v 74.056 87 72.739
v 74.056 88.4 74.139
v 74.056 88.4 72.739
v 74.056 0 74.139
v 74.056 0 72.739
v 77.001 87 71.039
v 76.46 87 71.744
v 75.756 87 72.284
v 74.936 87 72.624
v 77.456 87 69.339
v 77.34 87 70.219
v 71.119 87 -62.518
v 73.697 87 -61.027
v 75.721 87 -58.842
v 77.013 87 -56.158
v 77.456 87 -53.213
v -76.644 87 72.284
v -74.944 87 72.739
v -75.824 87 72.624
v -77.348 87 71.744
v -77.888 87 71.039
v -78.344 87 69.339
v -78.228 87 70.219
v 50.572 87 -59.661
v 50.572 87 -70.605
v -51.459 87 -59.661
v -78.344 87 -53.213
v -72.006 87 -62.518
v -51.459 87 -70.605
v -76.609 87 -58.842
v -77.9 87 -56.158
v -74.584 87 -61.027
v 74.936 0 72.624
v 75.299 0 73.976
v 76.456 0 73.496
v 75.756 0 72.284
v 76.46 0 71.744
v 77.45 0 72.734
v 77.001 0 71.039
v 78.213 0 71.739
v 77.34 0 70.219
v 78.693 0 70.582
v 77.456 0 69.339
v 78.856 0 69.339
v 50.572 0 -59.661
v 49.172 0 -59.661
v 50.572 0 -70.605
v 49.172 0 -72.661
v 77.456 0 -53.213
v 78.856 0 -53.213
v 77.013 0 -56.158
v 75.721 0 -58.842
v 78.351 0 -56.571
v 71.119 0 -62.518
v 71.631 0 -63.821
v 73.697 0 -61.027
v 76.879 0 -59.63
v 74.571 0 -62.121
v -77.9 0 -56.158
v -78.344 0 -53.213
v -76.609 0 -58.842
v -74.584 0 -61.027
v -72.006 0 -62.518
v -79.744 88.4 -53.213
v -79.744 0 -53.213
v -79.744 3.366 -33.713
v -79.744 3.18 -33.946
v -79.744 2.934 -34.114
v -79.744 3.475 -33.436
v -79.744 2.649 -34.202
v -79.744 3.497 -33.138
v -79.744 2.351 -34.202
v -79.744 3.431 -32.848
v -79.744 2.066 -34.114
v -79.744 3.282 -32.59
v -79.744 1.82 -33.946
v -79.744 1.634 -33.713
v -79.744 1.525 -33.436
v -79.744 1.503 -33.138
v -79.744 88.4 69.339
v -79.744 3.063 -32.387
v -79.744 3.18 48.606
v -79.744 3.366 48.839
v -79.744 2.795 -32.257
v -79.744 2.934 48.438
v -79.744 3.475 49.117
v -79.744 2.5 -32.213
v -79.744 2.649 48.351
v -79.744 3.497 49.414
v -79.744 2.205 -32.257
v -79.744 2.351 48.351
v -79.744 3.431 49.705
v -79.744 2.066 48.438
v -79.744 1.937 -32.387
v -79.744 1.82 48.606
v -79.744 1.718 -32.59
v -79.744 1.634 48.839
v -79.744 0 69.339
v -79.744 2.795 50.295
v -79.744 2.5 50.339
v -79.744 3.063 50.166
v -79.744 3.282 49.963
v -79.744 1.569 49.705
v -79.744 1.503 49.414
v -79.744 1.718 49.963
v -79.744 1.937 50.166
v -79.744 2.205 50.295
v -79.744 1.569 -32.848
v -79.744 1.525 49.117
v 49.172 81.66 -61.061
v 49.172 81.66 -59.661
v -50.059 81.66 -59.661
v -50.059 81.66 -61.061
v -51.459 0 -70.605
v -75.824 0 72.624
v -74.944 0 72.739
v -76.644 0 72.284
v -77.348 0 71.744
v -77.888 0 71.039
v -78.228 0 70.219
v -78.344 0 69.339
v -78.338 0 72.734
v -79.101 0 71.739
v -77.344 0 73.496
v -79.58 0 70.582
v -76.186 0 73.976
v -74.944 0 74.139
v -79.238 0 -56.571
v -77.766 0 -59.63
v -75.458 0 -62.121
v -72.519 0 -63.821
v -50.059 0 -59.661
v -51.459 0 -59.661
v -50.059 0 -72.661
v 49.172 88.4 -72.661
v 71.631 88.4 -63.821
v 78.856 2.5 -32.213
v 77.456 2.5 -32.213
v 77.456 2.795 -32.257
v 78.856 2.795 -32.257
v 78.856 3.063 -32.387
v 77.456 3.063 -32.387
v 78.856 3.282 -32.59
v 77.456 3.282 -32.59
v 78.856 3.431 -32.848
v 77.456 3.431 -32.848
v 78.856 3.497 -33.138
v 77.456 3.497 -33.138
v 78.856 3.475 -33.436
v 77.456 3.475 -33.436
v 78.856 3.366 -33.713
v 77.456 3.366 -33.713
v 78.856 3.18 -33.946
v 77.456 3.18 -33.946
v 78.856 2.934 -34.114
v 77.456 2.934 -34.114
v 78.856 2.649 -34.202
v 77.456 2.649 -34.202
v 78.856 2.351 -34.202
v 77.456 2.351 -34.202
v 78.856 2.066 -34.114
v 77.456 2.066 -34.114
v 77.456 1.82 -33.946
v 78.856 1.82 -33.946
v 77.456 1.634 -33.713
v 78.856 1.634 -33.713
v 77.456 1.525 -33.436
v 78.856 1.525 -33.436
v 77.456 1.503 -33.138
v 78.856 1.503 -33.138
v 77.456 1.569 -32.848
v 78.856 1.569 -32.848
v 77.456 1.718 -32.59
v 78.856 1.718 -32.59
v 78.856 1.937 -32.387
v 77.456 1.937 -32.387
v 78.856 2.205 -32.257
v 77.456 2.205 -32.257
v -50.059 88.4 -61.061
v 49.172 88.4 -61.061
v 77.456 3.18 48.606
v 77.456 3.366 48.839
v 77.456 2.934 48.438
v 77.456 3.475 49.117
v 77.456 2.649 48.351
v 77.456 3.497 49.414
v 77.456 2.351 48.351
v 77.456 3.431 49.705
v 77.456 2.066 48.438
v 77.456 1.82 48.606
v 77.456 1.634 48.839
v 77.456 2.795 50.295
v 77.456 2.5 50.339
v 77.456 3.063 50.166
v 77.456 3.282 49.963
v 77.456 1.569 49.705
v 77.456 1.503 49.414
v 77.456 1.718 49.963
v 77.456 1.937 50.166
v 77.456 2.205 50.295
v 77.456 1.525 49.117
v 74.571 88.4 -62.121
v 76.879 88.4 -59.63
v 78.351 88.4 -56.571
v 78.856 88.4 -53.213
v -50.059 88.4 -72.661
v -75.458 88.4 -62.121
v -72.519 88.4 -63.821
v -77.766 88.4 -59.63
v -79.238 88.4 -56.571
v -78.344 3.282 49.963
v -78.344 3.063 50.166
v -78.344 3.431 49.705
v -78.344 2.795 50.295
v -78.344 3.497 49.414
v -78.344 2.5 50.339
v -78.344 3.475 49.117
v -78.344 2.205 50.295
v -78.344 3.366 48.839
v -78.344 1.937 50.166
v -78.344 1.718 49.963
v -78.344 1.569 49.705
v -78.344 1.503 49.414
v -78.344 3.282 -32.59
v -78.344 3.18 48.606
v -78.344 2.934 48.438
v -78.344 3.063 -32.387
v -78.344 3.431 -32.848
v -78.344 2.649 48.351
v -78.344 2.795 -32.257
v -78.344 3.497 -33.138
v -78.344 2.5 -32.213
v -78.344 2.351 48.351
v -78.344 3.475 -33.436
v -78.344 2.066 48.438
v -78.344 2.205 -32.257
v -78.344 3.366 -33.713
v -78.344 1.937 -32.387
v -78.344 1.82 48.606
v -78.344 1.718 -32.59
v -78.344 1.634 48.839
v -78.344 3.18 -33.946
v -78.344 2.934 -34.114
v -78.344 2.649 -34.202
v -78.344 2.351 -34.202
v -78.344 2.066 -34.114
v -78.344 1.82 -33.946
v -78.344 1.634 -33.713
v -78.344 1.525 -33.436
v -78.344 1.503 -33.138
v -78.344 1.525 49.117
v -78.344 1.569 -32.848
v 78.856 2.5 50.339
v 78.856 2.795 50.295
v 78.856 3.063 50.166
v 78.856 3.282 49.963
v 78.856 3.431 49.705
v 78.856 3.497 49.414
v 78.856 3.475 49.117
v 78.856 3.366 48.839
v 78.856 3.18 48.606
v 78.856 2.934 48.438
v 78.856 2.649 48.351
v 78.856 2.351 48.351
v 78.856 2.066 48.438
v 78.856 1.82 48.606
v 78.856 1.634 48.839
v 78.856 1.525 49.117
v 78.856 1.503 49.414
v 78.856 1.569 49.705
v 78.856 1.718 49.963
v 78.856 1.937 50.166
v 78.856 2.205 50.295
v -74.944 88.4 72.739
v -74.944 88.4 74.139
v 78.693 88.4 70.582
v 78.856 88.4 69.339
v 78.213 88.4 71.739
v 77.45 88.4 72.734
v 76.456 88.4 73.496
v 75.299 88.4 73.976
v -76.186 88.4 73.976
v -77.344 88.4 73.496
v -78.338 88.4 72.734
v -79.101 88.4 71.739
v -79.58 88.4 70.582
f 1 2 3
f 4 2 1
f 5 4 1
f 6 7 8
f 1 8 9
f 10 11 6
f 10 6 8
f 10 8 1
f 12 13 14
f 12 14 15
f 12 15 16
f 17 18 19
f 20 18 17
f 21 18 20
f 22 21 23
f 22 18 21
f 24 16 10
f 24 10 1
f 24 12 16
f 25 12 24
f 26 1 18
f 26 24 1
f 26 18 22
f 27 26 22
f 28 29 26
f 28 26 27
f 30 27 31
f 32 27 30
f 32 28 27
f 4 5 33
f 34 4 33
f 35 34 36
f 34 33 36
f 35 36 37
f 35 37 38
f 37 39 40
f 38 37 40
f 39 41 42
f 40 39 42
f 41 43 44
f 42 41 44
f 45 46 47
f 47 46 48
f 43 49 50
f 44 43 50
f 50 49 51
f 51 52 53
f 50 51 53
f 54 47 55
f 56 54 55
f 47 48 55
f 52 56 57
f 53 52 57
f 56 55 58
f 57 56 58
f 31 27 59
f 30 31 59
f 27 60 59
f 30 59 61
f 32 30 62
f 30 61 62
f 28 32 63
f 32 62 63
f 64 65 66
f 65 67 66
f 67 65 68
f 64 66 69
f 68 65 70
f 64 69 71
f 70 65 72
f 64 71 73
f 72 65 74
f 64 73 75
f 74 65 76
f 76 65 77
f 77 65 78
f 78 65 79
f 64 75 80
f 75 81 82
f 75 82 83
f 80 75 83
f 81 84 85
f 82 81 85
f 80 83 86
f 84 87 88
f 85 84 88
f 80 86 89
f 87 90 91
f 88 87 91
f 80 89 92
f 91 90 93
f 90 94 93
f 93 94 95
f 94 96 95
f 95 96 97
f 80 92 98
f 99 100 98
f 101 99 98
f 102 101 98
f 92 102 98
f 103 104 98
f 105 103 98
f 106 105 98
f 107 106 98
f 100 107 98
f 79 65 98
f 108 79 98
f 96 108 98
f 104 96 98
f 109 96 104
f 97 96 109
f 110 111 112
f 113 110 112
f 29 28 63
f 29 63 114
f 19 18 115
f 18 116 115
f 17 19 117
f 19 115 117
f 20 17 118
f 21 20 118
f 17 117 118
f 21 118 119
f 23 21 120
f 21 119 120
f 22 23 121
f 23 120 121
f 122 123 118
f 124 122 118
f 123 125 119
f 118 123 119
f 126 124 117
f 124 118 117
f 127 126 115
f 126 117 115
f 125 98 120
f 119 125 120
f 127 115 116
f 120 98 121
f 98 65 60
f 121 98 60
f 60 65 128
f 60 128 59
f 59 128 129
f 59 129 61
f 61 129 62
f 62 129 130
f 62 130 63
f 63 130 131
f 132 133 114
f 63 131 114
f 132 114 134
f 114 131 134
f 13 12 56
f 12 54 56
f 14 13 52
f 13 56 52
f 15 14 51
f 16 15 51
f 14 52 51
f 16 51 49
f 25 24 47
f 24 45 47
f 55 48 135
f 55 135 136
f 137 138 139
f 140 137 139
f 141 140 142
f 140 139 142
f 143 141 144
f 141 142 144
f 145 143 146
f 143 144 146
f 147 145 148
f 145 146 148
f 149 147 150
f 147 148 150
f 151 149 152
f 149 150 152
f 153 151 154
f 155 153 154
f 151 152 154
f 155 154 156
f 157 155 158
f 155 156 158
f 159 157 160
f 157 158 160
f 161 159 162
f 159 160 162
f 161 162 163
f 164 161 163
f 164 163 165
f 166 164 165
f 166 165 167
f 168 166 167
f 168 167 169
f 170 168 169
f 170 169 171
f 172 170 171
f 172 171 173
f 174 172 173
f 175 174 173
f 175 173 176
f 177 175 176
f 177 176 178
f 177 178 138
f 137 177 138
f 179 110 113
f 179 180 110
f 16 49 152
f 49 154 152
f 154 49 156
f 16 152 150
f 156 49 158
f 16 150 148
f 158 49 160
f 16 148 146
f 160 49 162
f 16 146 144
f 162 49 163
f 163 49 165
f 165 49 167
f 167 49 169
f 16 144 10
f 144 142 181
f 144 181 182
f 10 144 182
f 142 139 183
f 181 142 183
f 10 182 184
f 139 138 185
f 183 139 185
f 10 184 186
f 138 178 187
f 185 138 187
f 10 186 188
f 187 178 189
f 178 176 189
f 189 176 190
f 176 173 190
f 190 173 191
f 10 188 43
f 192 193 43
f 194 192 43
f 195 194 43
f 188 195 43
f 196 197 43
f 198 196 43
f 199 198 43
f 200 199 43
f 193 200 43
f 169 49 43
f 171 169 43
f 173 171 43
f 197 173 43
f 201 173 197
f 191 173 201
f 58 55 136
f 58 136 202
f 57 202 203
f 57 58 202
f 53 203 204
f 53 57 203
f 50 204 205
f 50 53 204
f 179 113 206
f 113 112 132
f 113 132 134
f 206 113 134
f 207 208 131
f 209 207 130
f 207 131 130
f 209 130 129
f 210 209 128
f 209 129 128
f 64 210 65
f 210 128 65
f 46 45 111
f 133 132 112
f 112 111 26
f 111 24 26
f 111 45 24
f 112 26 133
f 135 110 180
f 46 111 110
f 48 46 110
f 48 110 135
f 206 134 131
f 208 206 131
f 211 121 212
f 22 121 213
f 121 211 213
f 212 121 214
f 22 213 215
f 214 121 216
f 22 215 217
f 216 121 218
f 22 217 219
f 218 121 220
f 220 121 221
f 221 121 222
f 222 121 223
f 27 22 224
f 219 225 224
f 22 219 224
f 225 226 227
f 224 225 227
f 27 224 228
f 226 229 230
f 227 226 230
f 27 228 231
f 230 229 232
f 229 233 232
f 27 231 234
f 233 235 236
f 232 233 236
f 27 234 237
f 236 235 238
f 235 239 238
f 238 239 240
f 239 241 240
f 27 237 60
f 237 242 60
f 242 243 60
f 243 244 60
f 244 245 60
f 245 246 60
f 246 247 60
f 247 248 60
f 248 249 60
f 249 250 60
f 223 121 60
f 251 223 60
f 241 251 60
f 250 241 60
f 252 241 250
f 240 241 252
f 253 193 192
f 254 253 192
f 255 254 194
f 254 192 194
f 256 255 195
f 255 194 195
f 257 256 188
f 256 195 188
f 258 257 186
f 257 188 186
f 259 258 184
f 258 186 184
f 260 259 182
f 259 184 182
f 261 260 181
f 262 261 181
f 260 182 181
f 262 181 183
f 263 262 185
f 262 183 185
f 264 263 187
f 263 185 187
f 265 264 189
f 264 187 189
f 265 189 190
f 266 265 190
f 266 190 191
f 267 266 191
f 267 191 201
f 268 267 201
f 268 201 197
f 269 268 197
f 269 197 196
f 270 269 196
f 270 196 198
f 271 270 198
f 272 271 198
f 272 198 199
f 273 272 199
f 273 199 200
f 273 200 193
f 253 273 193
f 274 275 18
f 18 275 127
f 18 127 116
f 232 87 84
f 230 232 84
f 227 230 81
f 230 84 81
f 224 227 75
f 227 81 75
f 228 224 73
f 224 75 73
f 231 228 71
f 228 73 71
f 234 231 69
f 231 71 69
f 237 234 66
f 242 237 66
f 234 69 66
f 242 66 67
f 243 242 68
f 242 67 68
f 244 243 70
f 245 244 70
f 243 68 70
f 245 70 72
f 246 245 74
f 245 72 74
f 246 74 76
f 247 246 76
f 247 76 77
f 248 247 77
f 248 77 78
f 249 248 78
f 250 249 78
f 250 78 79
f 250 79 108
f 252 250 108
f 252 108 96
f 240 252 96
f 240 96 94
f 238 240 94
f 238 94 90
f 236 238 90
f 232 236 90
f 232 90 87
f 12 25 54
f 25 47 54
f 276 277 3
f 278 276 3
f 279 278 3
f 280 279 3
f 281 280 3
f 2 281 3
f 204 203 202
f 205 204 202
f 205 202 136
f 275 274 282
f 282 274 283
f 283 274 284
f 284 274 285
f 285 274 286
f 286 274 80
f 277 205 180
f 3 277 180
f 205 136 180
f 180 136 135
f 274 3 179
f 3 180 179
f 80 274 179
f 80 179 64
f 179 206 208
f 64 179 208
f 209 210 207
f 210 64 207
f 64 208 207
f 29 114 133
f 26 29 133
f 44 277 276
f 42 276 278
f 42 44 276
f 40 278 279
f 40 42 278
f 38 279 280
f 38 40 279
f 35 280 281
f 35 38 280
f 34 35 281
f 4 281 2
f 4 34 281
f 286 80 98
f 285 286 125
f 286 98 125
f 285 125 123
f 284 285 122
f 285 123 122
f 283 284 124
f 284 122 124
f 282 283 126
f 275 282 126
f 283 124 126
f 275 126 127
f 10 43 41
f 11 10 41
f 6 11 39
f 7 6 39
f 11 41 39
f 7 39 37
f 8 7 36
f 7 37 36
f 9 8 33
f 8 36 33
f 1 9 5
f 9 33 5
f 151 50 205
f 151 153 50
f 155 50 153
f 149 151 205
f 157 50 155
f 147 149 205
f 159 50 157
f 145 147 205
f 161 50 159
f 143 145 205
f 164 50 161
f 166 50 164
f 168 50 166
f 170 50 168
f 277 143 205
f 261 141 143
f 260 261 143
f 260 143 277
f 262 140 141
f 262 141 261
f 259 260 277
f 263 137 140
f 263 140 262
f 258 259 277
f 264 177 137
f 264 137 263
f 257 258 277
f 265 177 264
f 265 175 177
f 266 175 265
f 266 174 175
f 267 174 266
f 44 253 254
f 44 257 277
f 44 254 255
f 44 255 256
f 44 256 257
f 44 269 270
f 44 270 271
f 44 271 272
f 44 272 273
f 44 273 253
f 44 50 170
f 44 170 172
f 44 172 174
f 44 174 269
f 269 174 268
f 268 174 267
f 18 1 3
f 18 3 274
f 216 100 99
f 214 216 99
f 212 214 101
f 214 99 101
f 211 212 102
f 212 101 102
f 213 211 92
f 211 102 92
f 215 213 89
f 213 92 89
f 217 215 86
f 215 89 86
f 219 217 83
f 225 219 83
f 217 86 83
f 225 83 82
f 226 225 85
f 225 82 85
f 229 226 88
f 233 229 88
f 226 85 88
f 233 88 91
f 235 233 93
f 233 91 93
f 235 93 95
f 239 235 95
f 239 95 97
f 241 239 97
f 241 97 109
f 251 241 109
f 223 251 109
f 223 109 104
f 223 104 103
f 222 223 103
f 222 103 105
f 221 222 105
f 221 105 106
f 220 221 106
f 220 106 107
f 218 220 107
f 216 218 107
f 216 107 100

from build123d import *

# Parameters (mm, degrees)
BOSS_EXTRUDE2_DEPTH = 82
BOSS_EXTRUDE3_DEPTH = 1.5
SKETCH4_W           = 149
SKETCH4_H           = 82
CUT_EXTRUDE2_DEPTH  = 1.5
SKETCH5_W           = 99.231457505
SKETCH5_H           = 0.2
CUT_EXTRUDE3_DEPTH  = 18
SKETCH6_R           = 1
CUT_EXTRUDE4_DEPTH  = 243
CUT_EXTRUDE5_DEPTH  = 16.4
BOSS_EXTRUDE4_DEPTH = 5
BOSS_EXTRUDE6_DEPTH = 1.4
SKETCH10_W          = 99.231457505
SKETCH10_H          = 5.34
SKETCH10_H_2        = 1.4
BOSS_EXTRUDE7_DEPTH = 1.4


with BuildPart() as part:
    # Sketch1 → Boss-Extrude2 (new body)
    with BuildSketch(Plane(origin=(0, 0, 0), x_dir=(1, 0, 0), z_dir=(0, 1, 0))):
        with BuildLine():
            Line((-0.443676805, -72.739461341), (-0.443676805, -74.139461341))
            Line((-0.443676805, -74.139461341), (74.056323195, -74.139461341))
            ThreePointArc((74.056323195, -74.139461341), (77.450435745, -72.733573891), (78.856323195, -69.339461341))
            Line((78.856323195, -69.339461341), (78.856323195, -3.839461341))
            Line((78.856323195, -3.839461341), (78.856323195, 53.213038835))
            ThreePointArc((78.856323195, 53.213038835), (76.87852757, 59.630364191), (71.631399559, 63.820995158))
            Line((71.631399559, 63.820995158), (49.172051948, 72.660538659))
            Line((49.172051948, 72.660538659), (49.172051948, 71.156007577))
            Line((49.172051948, 71.156007577), (49.172051948, 59.660538659))
            Line((49.172051948, 59.660538659), (50.572051948, 59.660538659))
            Line((50.572051948, 59.660538659), (50.572051948, 70.604995984))
            Line((50.572051948, 70.604995984), (71.118670883, 62.51826368))
            ThreePointArc((71.118670883, 62.51826368), (75.721414752, 58.842271604), (77.456323195, 53.213038835))
            Line((77.456323195, 53.213038835), (77.456323195, -3.839461341))
            Line((77.456323195, -3.839461341), (77.456323195, -69.339461341))
            ThreePointArc((77.456323195, -69.339461341), (76.460486251, -71.743624398), (74.056323195, -72.739461341))
            Line((74.056323195, -72.739461341), (-0.443676805, -72.739461341))
        make_face()
        with BuildLine():
            Line((-74.943676805, -74.139461341), (-0.443676805, -74.139461341))
            Line((-0.443676805, -74.139461341), (-0.443676805, -72.739461341))
            Line((-0.443676805, -72.739461341), (-74.943676805, -72.739461341))
            ThreePointArc((-74.943676805, -72.739461341), (-77.347839861, -71.743624398), (-78.343676805, -69.339461341))
            Line((-78.343676805, -69.339461341), (-78.343676805, -3.839461341))
            Line((-78.343676805, -3.839461341), (-78.343676805, 53.213038835))
            ThreePointArc((-78.343676805, 53.213038835), (-76.608768361, 58.842271604), (-72.006024493, 62.51826368))
            Line((-72.006024493, 62.51826368), (-51.459405557, 70.604995984))
            Line((-51.459405557, 70.604995984), (-51.459405557, 59.660538659))
            Line((-51.459405557, 59.660538659), (-50.059405557, 59.660538659))
            Line((-50.059405557, 59.660538659), (-50.059405557, 71.156007577))
            Line((-50.059405557, 71.156007577), (-50.059405557, 72.660538659))
            Line((-50.059405557, 72.660538659), (-72.518753169, 63.820995158))
            ThreePointArc((-72.518753169, 63.820995158), (-77.765881179, 59.630364191), (-79.743676805, 53.213038835))
            Line((-79.743676805, 53.213038835), (-79.743676805, -3.839461341))
            Line((-79.743676805, -3.839461341), (-79.743676805, -69.339461341))
            ThreePointArc((-79.743676805, -69.339461341), (-78.337789355, -72.733573891), (-74.943676805, -74.139461341))
        make_face()
    extrude(amount=BOSS_EXTRUDE2_DEPTH)

    # Sketch3 → Boss-Extrude3 (add)
    with BuildSketch(Plane(origin=(0, 82, 0), x_dir=(1, 0, 0), z_dir=(0, 1, 0))):
        with BuildLine():
            Line((-50.059405557, 59.660538659), (49.172051948, 59.660538659))
            Line((49.172051948, 59.660538659), (50.572051948, 59.660538659))
            Line((50.572051948, 59.660538659), (50.572051948, 70.604995984))
            Line((50.572051948, 70.604995984), (71.118670883, 62.51826368))
            ThreePointArc((71.118670883, 62.51826368), (75.721414752, 58.842271604), (77.456323195, 53.213038835))
            Line((77.456323195, 53.213038835), (77.456323195, -69.339461341))
            ThreePointArc((77.456323195, -69.339461341), (76.460486251, -71.743624398), (74.056323195, -72.739461341))
            Line((74.056323195, -72.739461341), (-74.943676805, -72.739461341))
            ThreePointArc((-74.943676805, -72.739461341), (-77.347839861, -71.743624398), (-78.343676805, -69.339461341))
            Line((-78.343676805, -69.339461341), (-78.343676805, 53.213038835))
            ThreePointArc((-78.343676805, 53.213038835), (-76.608768361, 58.842271604), (-72.006024493, 62.51826368))
            Line((-72.006024493, 62.51826368), (-51.459405557, 70.604995984))
            Line((-51.459405557, 70.604995984), (-51.459405557, 59.660538659))
            Line((-51.459405557, 59.660538659), (-50.059405557, 59.660538659))
        make_face()
    extrude(amount=-BOSS_EXTRUDE3_DEPTH)

    # Sketch4 → Cut-Extrude2 (cut)
    with BuildSketch(Plane.XY.offset(74.139461341)):
        with Locations((-0.443676805, 41)):
            Rectangle(SKETCH4_W, SKETCH4_H)
    extrude(amount=-CUT_EXTRUDE2_DEPTH, mode=Mode.SUBTRACT)

    # Sketch5 → Cut-Extrude3 (cut)
    with BuildSketch(Plane(origin=(0, 82, 0), x_dir=(1, 0, 0), z_dir=(0, 1, 0))):
        with Locations((-0.443676805, 59.560538659)):
            Rectangle(SKETCH5_W, SKETCH5_H)
    extrude(amount=-CUT_EXTRUDE3_DEPTH, mode=Mode.SUBTRACT)

    # Sketch6 → Cut-Extrude4 (cut)
    with BuildSketch(Plane.ZY.offset(79.743676805)):
        with Locations((-33.213038835, 2.5)):
            Circle(SKETCH6_R)
        with Locations((49.339461341, 2.5)):
            Circle(SKETCH6_R)
    extrude(amount=-CUT_EXTRUDE4_DEPTH, mode=Mode.SUBTRACT)

    # Sketch7 → Cut-Extrude5 (cut)
    with BuildSketch(Plane.XZ.offset(-80.5)):
        with BuildLine():
            Line((-50.059405557, -59.460538659), (49.172051948, -59.460538659))
            Line((49.172051948, -59.460538659), (49.172051948, -59.660538659))
            Line((49.172051948, -59.660538659), (50.572051948, -59.660538659))
            Line((50.572051948, -59.660538659), (50.572051948, -70.604995984))
            Line((50.572051948, -70.604995984), (71.118670883, -62.51826368))
            ThreePointArc((71.118670883, -62.51826368), (75.721414752, -58.842271604), (77.456323195, -53.213038835))
            Line((77.456323195, -53.213038835), (77.456323195, 69.339461341))
            ThreePointArc((77.456323195, 69.339461341), (76.460486251, 71.743624398), (74.056323195, 72.739461341))
            Line((74.056323195, 72.739461341), (74.056323195, 72.639461341))
            Line((74.056323195, 72.639461341), (-74.943676805, 72.639461341))
            Line((-74.943676805, 72.639461341), (-74.943676805, 72.739461341))
            ThreePointArc((-74.943676805, 72.739461341), (-77.347839861, 71.743624398), (-78.343676805, 69.339461341))
            Line((-78.343676805, 69.339461341), (-78.343676805, -53.213038835))
            ThreePointArc((-78.343676805, -53.213038835), (-76.608768361, -58.842271604), (-72.006024493, -62.51826368))
            Line((-72.006024493, -62.51826368), (-51.459405557, -70.604995984))
            Line((-51.459405557, -70.604995984), (-51.459405557, -59.660538659))
            Line((-51.459405557, -59.660538659), (-50.059405557, -59.660538659))
            Line((-50.059405557, -59.660538659), (-50.059405557, -59.460538659))
        make_face()
    extrude(amount=-CUT_EXTRUDE5_DEPTH, mode=Mode.SUBTRACT)

    # Sketch8 → Boss-Extrude4 (add)
    with BuildSketch(Plane(origin=(0, 82, 0), x_dir=(1, 0, 0), z_dir=(0, 1, 0))):
        with BuildLine():
            Line((74.056323195, -72.739461341), (74.056323195, -74.139461341))
            ThreePointArc((74.056323195, -74.139461341), (77.450435745, -72.733573891), (78.856323195, -69.339461341))
            Line((78.856323195, -69.339461341), (78.856323195, 53.213038835))
            ThreePointArc((78.856323195, 53.213038835), (76.87852757, 59.630364191), (71.631399559, 63.820995158))
            Line((71.631399559, 63.820995158), (49.172051948, 72.660538659))
            Line((49.172051948, 72.660538659), (49.172051948, 59.660538659))
            Line((49.172051948, 59.660538659), (50.572051948, 59.660538659))
            Line((50.572051948, 59.660538659), (50.572051948, 70.604995984))
            Line((50.572051948, 70.604995984), (71.118670883, 62.51826368))
            ThreePointArc((71.118670883, 62.51826368), (75.721414752, 58.842271604), (77.456323195, 53.213038835))
            Line((77.456323195, 53.213038835), (77.456323195, -69.339461341))
            ThreePointArc((77.456323195, -69.339461341), (76.460486251, -71.743624398), (74.056323195, -72.739461341))
        make_face()
        with BuildLine():
            Line((-51.459405557, 59.660538659), (-50.059405557, 59.660538659))
            Line((-50.059405557, 59.660538659), (-50.059405557, 72.660538659))
            Line((-50.059405557, 72.660538659), (-72.518753169, 63.820995158))
            ThreePointArc((-72.518753169, 63.820995158), (-77.765881179, 59.630364191), (-79.743676805, 53.213038835))
            Line((-79.743676805, 53.213038835), (-79.743676805, -69.339461341))
            ThreePointArc((-79.743676805, -69.339461341), (-78.337789355, -72.733573891), (-74.943676805, -74.139461341))
            Line((-74.943676805, -74.139461341), (-74.943676805, -72.739461341))
            ThreePointArc((-74.943676805, -72.739461341), (-77.347839861, -71.743624398), (-78.343676805, -69.339461341))
            Line((-78.343676805, -69.339461341), (-78.343676805, 53.213038835))
            ThreePointArc((-78.343676805, 53.213038835), (-76.608768361, 58.842271604), (-72.006024493, 62.51826368))
            Line((-72.006024493, 62.51826368), (-51.459405557, 70.604995984))
            Line((-51.459405557, 70.604995984), (-51.459405557, 59.660538659))
        make_face()
    extrude(amount=BOSS_EXTRUDE4_DEPTH)

    # Sketch9 → Boss-Extrude6 (add)
    with BuildSketch(Plane(origin=(0, 87, 0), x_dir=(1, 0, 0), z_dir=(0, 1, 0))):
        with BuildLine():
            Line((77.456323195, 53.213038835), (77.456323195, -69.339461341))
            ThreePointArc((77.456323195, -69.339461341), (76.460486251, -71.743624398), (74.056323195, -72.739461341))
            Line((74.056323195, -72.739461341), (-74.943676805, -72.739461341))
            ThreePointArc((-74.943676805, -72.739461341), (-77.347839861, -71.743624398), (-78.343676805, -69.339461341))
            Line((-78.343676805, -69.339461341), (-78.343676805, 53.213038835))
            ThreePointArc((-78.343676805, 53.213038835), (-76.608768361, 58.842271604), (-72.006024493, 62.51826368))
            Line((-72.006024493, 62.51826368), (-51.459405557, 70.604995984))
            Line((-51.459405557, 70.604995984), (-51.459405557, 59.660538659))
            Line((-51.459405557, 59.660538659), (-50.059405557, 59.660538659))
            Line((-50.059405557, 59.660538659), (49.172051948, 59.660538659))
            Line((49.172051948, 59.660538659), (50.572051948, 59.660538659))
            Line((50.572051948, 59.660538659), (50.572051948, 70.604995984))
            Line((50.572051948, 70.604995984), (71.118670883, 62.51826368))
            ThreePointArc((71.118670883, 62.51826368), (75.721414752, 58.842271604), (77.456323195, 53.213038835))
        make_face()
        with BuildLine():
            Line((-72.006024493, 62.51826368), (-51.459405557, 70.604995984))
            Line((-51.459405557, 70.604995984), (-51.459405557, 59.660538659))
            Line((-51.459405557, 59.660538659), (-50.059405557, 59.660538659))
            Line((-50.059405557, 59.660538659), (-50.059405557, 72.660538659))
            Line((-50.059405557, 72.660538659), (-72.518753169, 63.820995158))
            ThreePointArc((-72.518753169, 63.820995158), (-77.765881179, 59.630364191), (-79.743676805, 53.213038835))
            Line((-79.743676805, 53.213038835), (-79.743676805, -69.339461341))
            ThreePointArc((-79.743676805, -69.339461341), (-78.337789355, -72.733573891), (-74.943676805, -74.139461341))
            Line((-74.943676805, -74.139461341), (-74.943676805, -72.739461341))
            ThreePointArc((-74.943676805, -72.739461341), (-77.347839861, -71.743624398), (-78.343676805, -69.339461341))
            Line((-78.343676805, -69.339461341), (-78.343676805, 53.213038835))
            ThreePointArc((-78.343676805, 53.213038835), (-76.608768361, 58.842271604), (-72.006024493, 62.51826368))
        make_face()
        with BuildLine():
            ThreePointArc((77.456323195, 53.213038835), (75.721414752, 58.842271604), (71.118670883, 62.51826368))
            Line((71.118670883, 62.51826368), (50.572051948, 70.604995984))
            Line((50.572051948, 70.604995984), (50.572051948, 59.660538659))
            Line((50.572051948, 59.660538659), (49.172051948, 59.660538659))
            Line((49.172051948, 59.660538659), (49.172051948, 72.660538659))
            Line((49.172051948, 72.660538659), (71.631399559, 63.820995158))
            ThreePointArc((71.631399559, 63.820995158), (76.87852757, 59.630364191), (78.856323195, 53.213038835))
            Line((78.856323195, 53.213038835), (78.856323195, -69.339461341))
            ThreePointArc((78.856323195, -69.339461341), (77.450435745, -72.733573891), (74.056323195, -74.139461341))
            Line((74.056323195, -74.139461341), (74.056323195, -72.739461341))
            ThreePointArc((74.056323195, -72.739461341), (76.460486251, -71.743624398), (77.456323195, -69.339461341))
            Line((77.456323195, -69.339461341), (77.456323195, 53.213038835))
        make_face()
    extrude(amount=BOSS_EXTRUDE6_DEPTH)

    # Sketch10 → Boss-Extrude7 (add)
    with BuildSketch(Plane(origin=(0, 0, -59.660538659), x_dir=(-1, 0, 0), z_dir=(0, 0, -1))):
        with Locations((0.443676805, 84.33)):
            Rectangle(SKETCH10_W, SKETCH10_H)
        with Locations((0.443676805, 87.7)):
            Rectangle(SKETCH10_W, SKETCH10_H_2)
    extrude(amount=BOSS_EXTRUDE7_DEPTH)


solid = part.part
